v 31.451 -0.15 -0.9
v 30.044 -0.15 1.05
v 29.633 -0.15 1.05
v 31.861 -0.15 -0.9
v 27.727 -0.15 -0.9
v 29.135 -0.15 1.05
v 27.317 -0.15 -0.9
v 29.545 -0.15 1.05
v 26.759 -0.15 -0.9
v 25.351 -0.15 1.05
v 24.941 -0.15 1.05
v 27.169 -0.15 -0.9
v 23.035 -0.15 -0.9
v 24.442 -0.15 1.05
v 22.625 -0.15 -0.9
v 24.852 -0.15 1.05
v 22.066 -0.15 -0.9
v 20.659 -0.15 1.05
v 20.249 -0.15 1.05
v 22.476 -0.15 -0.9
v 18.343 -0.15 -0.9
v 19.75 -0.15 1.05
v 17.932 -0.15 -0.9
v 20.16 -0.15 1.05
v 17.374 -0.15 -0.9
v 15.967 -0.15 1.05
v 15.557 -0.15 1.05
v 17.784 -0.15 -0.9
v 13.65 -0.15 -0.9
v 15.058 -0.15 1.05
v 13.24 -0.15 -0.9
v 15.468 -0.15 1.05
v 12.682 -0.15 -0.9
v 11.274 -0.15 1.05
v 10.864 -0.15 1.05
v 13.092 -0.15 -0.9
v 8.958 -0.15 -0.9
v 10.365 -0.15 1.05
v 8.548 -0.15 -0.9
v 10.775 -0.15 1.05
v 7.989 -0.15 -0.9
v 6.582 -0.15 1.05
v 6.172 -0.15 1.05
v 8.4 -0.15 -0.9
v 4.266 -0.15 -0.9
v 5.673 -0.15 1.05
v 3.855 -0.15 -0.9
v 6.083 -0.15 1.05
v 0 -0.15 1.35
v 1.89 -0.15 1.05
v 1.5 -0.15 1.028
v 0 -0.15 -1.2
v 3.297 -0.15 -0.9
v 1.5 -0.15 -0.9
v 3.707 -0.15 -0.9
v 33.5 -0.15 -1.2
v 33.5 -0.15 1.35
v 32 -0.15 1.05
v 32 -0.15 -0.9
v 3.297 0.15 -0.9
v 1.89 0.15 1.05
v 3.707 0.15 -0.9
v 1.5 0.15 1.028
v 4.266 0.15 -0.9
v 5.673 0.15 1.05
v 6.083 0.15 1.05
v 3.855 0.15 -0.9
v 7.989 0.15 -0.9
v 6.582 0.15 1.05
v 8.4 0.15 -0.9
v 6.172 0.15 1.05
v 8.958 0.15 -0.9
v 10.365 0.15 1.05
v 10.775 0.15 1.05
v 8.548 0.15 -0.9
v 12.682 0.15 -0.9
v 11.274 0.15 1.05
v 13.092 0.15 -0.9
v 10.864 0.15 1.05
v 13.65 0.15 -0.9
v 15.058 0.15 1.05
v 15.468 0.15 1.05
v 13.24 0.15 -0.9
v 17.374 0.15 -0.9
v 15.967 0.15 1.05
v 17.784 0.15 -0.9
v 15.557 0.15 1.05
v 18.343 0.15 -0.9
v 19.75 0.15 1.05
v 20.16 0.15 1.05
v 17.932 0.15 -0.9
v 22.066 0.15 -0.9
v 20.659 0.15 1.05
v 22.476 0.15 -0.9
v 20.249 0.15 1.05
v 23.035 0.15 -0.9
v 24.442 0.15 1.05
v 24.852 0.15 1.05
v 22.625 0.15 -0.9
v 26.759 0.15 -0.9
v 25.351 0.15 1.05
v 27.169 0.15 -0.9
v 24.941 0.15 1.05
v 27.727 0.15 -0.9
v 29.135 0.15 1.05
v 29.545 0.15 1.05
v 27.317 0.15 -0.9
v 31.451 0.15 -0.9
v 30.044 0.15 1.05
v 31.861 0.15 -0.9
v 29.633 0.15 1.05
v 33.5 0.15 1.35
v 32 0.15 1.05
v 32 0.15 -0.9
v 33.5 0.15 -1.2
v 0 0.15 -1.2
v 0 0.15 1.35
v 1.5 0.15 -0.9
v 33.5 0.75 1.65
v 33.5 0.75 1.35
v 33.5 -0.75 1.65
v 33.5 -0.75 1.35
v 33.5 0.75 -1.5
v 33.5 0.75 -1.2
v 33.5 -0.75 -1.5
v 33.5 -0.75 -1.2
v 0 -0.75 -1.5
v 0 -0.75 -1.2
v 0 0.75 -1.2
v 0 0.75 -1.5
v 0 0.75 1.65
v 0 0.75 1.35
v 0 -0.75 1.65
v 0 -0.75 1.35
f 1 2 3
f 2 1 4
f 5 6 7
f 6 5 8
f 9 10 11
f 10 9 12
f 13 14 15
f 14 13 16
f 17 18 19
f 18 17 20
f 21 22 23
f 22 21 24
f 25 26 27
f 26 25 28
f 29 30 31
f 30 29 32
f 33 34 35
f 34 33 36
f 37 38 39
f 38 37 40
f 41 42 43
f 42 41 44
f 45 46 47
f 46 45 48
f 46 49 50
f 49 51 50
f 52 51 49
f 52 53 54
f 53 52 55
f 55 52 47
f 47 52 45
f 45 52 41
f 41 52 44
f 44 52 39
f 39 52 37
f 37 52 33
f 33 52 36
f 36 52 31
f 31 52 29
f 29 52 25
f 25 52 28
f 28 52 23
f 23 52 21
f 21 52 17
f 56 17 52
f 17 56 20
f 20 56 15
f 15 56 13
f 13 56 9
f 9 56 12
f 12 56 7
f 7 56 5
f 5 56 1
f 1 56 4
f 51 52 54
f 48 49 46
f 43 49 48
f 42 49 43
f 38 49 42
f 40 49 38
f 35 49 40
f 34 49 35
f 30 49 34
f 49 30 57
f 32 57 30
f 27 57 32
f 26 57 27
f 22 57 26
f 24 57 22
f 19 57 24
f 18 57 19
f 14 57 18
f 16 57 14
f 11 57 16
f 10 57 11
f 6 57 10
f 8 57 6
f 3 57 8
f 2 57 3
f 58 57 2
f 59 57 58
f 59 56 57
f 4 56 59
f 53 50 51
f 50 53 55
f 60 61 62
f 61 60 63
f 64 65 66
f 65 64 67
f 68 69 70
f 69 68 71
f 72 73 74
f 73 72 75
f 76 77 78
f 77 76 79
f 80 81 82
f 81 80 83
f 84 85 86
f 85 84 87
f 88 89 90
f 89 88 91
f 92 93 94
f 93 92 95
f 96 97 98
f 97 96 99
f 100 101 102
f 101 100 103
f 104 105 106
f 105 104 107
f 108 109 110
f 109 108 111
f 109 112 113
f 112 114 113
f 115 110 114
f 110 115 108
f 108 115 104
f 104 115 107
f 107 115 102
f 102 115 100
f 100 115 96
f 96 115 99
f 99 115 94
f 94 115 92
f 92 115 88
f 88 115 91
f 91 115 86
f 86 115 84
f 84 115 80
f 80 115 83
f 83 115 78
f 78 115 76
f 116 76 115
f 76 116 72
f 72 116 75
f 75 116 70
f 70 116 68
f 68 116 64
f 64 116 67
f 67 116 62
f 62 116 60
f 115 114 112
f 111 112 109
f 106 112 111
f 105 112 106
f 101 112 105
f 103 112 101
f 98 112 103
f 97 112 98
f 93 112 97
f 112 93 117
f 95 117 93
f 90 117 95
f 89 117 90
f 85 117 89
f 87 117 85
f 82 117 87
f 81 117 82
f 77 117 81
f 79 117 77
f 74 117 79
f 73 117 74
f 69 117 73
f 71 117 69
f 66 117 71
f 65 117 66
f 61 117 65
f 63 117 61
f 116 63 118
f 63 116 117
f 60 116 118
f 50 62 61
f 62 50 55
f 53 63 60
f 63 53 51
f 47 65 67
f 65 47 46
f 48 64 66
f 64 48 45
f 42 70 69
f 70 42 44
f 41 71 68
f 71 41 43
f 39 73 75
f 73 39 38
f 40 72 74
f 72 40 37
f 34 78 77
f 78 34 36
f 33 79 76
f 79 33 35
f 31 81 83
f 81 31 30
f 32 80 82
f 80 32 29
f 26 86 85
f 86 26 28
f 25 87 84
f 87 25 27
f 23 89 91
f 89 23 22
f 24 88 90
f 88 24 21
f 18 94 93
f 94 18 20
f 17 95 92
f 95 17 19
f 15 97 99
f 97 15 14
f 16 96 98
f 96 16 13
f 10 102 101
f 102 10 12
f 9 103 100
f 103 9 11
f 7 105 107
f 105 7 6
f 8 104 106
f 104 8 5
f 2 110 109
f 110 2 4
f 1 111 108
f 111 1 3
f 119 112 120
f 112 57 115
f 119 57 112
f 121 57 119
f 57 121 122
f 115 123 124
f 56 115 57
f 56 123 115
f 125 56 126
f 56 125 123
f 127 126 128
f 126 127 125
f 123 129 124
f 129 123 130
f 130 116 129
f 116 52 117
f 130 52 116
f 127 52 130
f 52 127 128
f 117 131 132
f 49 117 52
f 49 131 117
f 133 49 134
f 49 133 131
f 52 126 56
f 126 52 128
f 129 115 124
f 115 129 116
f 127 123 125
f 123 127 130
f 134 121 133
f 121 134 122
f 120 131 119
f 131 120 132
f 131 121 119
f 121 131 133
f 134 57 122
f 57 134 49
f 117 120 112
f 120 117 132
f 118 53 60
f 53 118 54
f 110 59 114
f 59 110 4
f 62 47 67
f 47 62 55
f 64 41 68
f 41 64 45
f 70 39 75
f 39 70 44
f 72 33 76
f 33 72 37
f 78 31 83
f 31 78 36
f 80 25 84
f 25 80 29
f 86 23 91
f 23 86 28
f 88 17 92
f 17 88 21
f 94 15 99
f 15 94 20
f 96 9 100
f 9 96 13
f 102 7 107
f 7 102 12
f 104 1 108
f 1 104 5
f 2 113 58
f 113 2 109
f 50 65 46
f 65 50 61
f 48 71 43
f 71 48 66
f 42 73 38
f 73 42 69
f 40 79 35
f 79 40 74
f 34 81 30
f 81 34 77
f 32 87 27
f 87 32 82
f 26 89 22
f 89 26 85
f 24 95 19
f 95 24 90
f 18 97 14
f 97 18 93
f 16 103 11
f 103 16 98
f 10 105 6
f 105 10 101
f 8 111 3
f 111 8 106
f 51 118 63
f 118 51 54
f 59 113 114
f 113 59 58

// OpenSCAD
//
//
//  Part of the customizable Bridge Creator
//  Will Merrell
//  April 4, 2021
//
//
// Bridge Creator is free software: you can redistribute it and/or modify it under the terms of the
// GNU General Public License as published by the Free Software Foundation, either version 3 of
// the License, or (at your option) any later version.
//
// Bridge Creator is distributed in the hope that it will be useful, but WITHOUT ANY WARRANTY;
// without even the implied warranty of MERCHANTABILITY or FITNESS FOR A PARTICULAR PURPOSE.
// See the GNU General Public License for more details.
//
// You should have received a copy of the GNU General Public License along with Bridge Creator/.
// If not, see <https://www.gnu.org/licenses/>.
//

function angle_of(Xlen, Ylen) = atan2(Xlen, Ylen);

function hypotenuse(A, B) = sqrt((A*A)+(B*B));

//
// beam
// type:   I: an I beam, T: a T Beam, L: an L Beam, O: a box beam with holes. X: an X braced beam, B: a box beam
// length: length of the beam
// height: is always the height of the web, the thickness of the beam from flange to flange
// width:  is always the width of the flanges perpendicular to the web
// thick:  is the thickness of the material that makes the web and flanges
// start:  for X or O beams the start point of the pattern
// end:    for X or O beams the end point of the pattern
//
// beam("I", 33.5, 3.5, 3, 0.3);
//
module beam(type, length, height, width, thick, start=undef, end=undef) {
  ha  = height/2;
  wa  = width/2;
  ta  = thick/2;
  hl  = thick*2;
  off = (wa*2)+hl;
  st  = is_undef(start) ? wa : start+width;
  en  = is_undef(end) ? length-wa : end-width;
  // echo(st=st, off=off, en=en);
  xx  = width-(thick*2);
  ln  = ceil((en-st)/xx);
  len = (en-st)/ln;

  if(type=="I" || type=="i") {
    translate([0, -ta, -ha])
      cube([length, thick, height]);
    translate([0, -wa, -ha])
      cube([length, width, thick]);
    translate([0, -wa, ha])
      cube([length, width, thick]);
  } else if(type=="T" || type=="t") {
    translate([0, -ta, -ha])
      cube([length, thick, height]);
    translate([0, -wa, ha-thick])
      cube([length, width, thick]);
  } else if(type=="L" || type=="l") {
    translate([0, 0, 0])
      cube([length, thick, height]);
    translate([0, -width, 0])
      cube([length, width, thick]);
  } else if(type=="O" || type=="o") {
    translate([0, -wa+thick, -ha])
      cube([length, thick, height]);
    translate([0, wa-(thick*2), -ha])
      cube([length, thick, height]);

    translate([0, -wa, -ha]) {
      difference() {
        cube([length, width, thick]);
        for(i = [st : off : en]) {
          // echo(i=i);
          hull() {
            translate([i, wa, ta]) cylinder(h=hl, d=wa, center=true, $fn=36);
            translate([i+hl, wa, ta]) cylinder(h=hl, d=wa, center=true, $fn=36);
          }
        }
      }
    }
    translate([0, -wa, ha]) {
      difference() {
        cube([length, width, thick]);
        for(i = [st : off : en]) {
          hull() {
            translate([i, wa, ta]) cylinder(h=hl, d=wa, center=true, $fn=36);
            translate([i+hl, wa, ta]) cylinder(h=hl, d=wa, center=true, $fn=36);
          }
        }
      }
    }
  } else if(type=="X" || type=="x") {
    translate([0,   -wa+thick,     -ha])     cube([length, thick,   height]);
    translate([0,    wa-(thick*2), -ha])     cube([length, thick,   height]);

    translate([0,   -wa,           -ha])     cube([length, thick*2, thick]);
    translate([0,    wa-(thick*2), -ha])     cube([length, thick*2, thick]);
    translate([0,   -wa,            ha-ta])  cube([length, thick*2, thick]);
    translate([0,    wa-(thick*2),  ha-ta])  cube([length, thick*2, thick]);

    translate([0,   -wa,            ha-ta])  cube([st,     width,   thick]);
    translate([en,  -wa,            ha-ta])  cube([st,     width,   thick]);
    translate([0,   -wa,           -ha])     cube([st,     width,   thick]);
    translate([en,  -wa,           -ha])     cube([st,     width,   thick]);

    xang = angle_of(width, len+thick+ta);
    xlen = hypotenuse(len-thick, width);
    for(i = [st : len : en-wa]) {
      translate([i,       -wa,         ha+ta]) rotate([ 0, 0,  xang]) cube([xlen, thick, ta]);
      translate([i-thick,  wa-thick,   ha+ta]) rotate([ 0, 0, -xang]) cube([xlen, thick, ta]);
      translate([i,       -wa,        -ha-ta]) rotate([ 0, 0,  xang]) cube([xlen, thick, ta]);
      translate([i-thick,  wa-thick,  -ha-ta]) rotate([ 0, 0, -xang]) cube([xlen, thick, ta]);
    }
  } else if(type=="C" || type=="c") {
    translate([0,   -wa,     -ha])     cube([length, thick,   height]);
    translate([0,    wa-ta, -ha])     cube([length, thick,   height]);

    translate([0,   -wa,           -ta])     cube([length, thick*2, thick]);
    translate([0,    wa-(thick)-ta, -ta])     cube([length, thick*2, thick]);
    translate([0,   -wa,           -ta])     cube([st,     width,   thick]);
    translate([en,  -wa,           -ta])     cube([st,     width,   thick]);

    xang = angle_of(width, len+thick+ta);
    xlen = hypotenuse(width, len);
    for(i = [st : len : en-wa]) {
      translate([i,       -wa+ta,         -ta]) rotate([ 0, 0,  xang]) cube([xlen, thick, thick]);
      translate([i-thick,  wa-ta,   -ta]) rotate([ 0, 0, -xang]) cube([xlen, thick, thick]);
    }
  } else if(type=="V" || type=="v") {
    rotate([90,0,0]) {
      translate([0,   -wa,     -ha])     cube([length, thick,   height]);
      translate([0,    wa-ta, -ha])     cube([length, thick,   height]);

      translate([0,   -wa,           -ta])     cube([length, thick*2, thick]);
      translate([0,    wa-(thick)-ta, -ta])     cube([length, thick*2, thick]);
      translate([0,   -wa,           -ta])     cube([st,     width,   thick]);
      translate([en,  -wa,           -ta])     cube([st,     width,   thick]);

      xang = angle_of(width, len+thick+ta);
      xlen = hypotenuse(width, len);
      stop = ((en-wa-st)/len);
      // for(i = [st : len : en-wa]) {
      for(i = [0 : 1 : stop]) {
        // echo(st=st, en=en, stop=stop, i=i)
        if ((i%2) > 0) {
          translate([(i*len)+st,       -wa+ta,         -ta]) rotate([ 0, 0,  xang]) cube([xlen, thick, thick]);
          // translate([i-thick,  wa-ta,   -ta]) rotate([ 0, 0, -xang]) cube([xlen, thick, thick]);
        } else {
          // translate([i,       -wa+ta,         -ta]) rotate([ 0, 0,  xang]) cube([xlen, thick, thick]);
          translate([(i*len)-thick+st,  wa-ta,   -ta]) rotate([ 0, 0, -xang]) cube([xlen, thick, thick]);
        }
      }
    }
  } else if(type=="B" || type=="b") {
    translate([0, -wa+thick, -ha])     cube([length, thick, height]);
    translate([0, wa-(thick*2), -ha])  cube([length, thick, height]);
    translate([0, -wa, -ha])        cube([length, width, thick]);
    translate([0, -wa, ha])         cube([length, width, thick]);
  }
}

// Xpos, Ypos, Zpos
module beam_to(start, end, rot, type, height, width, thick) {
  // echo(start=start, end=end, rot=rot, type=type, height=height, width=width, thick=thick);
  yang = angle_of(end.z-start.z, hypotenuse(end.x-start.x,end.y-start.y));
  zang = angle_of(end.y-start.y, end.x-start.x);
  len  = hypotenuse(end.z-start.z, hypotenuse(end.x-start.x, end.y-start.y));
  offset = (height > width ? height : width)*2;
  translate([start.x, start.y, start.z])
    rotate([rot, -yang, zang]) 
      translate([-offset, 0, 0]) 
        beam(type, len+(offset*2), height, width, thick, offset, len+offset);
  // echo(len=len, offset=offset, yang=yang, zang=zang);
  // translate([start.x, start.y, start.z])
  //   color("blue") cube([1, 1, 10], true);
  // translate([end.x, end.y, end.z])
  //   color("red") cube([1, 1, 10], true);
}

// rotate([0,0,90]) 
beam("v", 33.5, 1.5, 3, 0.3);

// difference () {
  //  beam_to([0,0,0], [55,0,25], 0, "c", 3.5, 3, 0.3);

//   translate([-10, -5, -15])
//     cube([20,10,15]);

//   translate([15, 5, 40])
//     cube([10,10,10]);
// }
